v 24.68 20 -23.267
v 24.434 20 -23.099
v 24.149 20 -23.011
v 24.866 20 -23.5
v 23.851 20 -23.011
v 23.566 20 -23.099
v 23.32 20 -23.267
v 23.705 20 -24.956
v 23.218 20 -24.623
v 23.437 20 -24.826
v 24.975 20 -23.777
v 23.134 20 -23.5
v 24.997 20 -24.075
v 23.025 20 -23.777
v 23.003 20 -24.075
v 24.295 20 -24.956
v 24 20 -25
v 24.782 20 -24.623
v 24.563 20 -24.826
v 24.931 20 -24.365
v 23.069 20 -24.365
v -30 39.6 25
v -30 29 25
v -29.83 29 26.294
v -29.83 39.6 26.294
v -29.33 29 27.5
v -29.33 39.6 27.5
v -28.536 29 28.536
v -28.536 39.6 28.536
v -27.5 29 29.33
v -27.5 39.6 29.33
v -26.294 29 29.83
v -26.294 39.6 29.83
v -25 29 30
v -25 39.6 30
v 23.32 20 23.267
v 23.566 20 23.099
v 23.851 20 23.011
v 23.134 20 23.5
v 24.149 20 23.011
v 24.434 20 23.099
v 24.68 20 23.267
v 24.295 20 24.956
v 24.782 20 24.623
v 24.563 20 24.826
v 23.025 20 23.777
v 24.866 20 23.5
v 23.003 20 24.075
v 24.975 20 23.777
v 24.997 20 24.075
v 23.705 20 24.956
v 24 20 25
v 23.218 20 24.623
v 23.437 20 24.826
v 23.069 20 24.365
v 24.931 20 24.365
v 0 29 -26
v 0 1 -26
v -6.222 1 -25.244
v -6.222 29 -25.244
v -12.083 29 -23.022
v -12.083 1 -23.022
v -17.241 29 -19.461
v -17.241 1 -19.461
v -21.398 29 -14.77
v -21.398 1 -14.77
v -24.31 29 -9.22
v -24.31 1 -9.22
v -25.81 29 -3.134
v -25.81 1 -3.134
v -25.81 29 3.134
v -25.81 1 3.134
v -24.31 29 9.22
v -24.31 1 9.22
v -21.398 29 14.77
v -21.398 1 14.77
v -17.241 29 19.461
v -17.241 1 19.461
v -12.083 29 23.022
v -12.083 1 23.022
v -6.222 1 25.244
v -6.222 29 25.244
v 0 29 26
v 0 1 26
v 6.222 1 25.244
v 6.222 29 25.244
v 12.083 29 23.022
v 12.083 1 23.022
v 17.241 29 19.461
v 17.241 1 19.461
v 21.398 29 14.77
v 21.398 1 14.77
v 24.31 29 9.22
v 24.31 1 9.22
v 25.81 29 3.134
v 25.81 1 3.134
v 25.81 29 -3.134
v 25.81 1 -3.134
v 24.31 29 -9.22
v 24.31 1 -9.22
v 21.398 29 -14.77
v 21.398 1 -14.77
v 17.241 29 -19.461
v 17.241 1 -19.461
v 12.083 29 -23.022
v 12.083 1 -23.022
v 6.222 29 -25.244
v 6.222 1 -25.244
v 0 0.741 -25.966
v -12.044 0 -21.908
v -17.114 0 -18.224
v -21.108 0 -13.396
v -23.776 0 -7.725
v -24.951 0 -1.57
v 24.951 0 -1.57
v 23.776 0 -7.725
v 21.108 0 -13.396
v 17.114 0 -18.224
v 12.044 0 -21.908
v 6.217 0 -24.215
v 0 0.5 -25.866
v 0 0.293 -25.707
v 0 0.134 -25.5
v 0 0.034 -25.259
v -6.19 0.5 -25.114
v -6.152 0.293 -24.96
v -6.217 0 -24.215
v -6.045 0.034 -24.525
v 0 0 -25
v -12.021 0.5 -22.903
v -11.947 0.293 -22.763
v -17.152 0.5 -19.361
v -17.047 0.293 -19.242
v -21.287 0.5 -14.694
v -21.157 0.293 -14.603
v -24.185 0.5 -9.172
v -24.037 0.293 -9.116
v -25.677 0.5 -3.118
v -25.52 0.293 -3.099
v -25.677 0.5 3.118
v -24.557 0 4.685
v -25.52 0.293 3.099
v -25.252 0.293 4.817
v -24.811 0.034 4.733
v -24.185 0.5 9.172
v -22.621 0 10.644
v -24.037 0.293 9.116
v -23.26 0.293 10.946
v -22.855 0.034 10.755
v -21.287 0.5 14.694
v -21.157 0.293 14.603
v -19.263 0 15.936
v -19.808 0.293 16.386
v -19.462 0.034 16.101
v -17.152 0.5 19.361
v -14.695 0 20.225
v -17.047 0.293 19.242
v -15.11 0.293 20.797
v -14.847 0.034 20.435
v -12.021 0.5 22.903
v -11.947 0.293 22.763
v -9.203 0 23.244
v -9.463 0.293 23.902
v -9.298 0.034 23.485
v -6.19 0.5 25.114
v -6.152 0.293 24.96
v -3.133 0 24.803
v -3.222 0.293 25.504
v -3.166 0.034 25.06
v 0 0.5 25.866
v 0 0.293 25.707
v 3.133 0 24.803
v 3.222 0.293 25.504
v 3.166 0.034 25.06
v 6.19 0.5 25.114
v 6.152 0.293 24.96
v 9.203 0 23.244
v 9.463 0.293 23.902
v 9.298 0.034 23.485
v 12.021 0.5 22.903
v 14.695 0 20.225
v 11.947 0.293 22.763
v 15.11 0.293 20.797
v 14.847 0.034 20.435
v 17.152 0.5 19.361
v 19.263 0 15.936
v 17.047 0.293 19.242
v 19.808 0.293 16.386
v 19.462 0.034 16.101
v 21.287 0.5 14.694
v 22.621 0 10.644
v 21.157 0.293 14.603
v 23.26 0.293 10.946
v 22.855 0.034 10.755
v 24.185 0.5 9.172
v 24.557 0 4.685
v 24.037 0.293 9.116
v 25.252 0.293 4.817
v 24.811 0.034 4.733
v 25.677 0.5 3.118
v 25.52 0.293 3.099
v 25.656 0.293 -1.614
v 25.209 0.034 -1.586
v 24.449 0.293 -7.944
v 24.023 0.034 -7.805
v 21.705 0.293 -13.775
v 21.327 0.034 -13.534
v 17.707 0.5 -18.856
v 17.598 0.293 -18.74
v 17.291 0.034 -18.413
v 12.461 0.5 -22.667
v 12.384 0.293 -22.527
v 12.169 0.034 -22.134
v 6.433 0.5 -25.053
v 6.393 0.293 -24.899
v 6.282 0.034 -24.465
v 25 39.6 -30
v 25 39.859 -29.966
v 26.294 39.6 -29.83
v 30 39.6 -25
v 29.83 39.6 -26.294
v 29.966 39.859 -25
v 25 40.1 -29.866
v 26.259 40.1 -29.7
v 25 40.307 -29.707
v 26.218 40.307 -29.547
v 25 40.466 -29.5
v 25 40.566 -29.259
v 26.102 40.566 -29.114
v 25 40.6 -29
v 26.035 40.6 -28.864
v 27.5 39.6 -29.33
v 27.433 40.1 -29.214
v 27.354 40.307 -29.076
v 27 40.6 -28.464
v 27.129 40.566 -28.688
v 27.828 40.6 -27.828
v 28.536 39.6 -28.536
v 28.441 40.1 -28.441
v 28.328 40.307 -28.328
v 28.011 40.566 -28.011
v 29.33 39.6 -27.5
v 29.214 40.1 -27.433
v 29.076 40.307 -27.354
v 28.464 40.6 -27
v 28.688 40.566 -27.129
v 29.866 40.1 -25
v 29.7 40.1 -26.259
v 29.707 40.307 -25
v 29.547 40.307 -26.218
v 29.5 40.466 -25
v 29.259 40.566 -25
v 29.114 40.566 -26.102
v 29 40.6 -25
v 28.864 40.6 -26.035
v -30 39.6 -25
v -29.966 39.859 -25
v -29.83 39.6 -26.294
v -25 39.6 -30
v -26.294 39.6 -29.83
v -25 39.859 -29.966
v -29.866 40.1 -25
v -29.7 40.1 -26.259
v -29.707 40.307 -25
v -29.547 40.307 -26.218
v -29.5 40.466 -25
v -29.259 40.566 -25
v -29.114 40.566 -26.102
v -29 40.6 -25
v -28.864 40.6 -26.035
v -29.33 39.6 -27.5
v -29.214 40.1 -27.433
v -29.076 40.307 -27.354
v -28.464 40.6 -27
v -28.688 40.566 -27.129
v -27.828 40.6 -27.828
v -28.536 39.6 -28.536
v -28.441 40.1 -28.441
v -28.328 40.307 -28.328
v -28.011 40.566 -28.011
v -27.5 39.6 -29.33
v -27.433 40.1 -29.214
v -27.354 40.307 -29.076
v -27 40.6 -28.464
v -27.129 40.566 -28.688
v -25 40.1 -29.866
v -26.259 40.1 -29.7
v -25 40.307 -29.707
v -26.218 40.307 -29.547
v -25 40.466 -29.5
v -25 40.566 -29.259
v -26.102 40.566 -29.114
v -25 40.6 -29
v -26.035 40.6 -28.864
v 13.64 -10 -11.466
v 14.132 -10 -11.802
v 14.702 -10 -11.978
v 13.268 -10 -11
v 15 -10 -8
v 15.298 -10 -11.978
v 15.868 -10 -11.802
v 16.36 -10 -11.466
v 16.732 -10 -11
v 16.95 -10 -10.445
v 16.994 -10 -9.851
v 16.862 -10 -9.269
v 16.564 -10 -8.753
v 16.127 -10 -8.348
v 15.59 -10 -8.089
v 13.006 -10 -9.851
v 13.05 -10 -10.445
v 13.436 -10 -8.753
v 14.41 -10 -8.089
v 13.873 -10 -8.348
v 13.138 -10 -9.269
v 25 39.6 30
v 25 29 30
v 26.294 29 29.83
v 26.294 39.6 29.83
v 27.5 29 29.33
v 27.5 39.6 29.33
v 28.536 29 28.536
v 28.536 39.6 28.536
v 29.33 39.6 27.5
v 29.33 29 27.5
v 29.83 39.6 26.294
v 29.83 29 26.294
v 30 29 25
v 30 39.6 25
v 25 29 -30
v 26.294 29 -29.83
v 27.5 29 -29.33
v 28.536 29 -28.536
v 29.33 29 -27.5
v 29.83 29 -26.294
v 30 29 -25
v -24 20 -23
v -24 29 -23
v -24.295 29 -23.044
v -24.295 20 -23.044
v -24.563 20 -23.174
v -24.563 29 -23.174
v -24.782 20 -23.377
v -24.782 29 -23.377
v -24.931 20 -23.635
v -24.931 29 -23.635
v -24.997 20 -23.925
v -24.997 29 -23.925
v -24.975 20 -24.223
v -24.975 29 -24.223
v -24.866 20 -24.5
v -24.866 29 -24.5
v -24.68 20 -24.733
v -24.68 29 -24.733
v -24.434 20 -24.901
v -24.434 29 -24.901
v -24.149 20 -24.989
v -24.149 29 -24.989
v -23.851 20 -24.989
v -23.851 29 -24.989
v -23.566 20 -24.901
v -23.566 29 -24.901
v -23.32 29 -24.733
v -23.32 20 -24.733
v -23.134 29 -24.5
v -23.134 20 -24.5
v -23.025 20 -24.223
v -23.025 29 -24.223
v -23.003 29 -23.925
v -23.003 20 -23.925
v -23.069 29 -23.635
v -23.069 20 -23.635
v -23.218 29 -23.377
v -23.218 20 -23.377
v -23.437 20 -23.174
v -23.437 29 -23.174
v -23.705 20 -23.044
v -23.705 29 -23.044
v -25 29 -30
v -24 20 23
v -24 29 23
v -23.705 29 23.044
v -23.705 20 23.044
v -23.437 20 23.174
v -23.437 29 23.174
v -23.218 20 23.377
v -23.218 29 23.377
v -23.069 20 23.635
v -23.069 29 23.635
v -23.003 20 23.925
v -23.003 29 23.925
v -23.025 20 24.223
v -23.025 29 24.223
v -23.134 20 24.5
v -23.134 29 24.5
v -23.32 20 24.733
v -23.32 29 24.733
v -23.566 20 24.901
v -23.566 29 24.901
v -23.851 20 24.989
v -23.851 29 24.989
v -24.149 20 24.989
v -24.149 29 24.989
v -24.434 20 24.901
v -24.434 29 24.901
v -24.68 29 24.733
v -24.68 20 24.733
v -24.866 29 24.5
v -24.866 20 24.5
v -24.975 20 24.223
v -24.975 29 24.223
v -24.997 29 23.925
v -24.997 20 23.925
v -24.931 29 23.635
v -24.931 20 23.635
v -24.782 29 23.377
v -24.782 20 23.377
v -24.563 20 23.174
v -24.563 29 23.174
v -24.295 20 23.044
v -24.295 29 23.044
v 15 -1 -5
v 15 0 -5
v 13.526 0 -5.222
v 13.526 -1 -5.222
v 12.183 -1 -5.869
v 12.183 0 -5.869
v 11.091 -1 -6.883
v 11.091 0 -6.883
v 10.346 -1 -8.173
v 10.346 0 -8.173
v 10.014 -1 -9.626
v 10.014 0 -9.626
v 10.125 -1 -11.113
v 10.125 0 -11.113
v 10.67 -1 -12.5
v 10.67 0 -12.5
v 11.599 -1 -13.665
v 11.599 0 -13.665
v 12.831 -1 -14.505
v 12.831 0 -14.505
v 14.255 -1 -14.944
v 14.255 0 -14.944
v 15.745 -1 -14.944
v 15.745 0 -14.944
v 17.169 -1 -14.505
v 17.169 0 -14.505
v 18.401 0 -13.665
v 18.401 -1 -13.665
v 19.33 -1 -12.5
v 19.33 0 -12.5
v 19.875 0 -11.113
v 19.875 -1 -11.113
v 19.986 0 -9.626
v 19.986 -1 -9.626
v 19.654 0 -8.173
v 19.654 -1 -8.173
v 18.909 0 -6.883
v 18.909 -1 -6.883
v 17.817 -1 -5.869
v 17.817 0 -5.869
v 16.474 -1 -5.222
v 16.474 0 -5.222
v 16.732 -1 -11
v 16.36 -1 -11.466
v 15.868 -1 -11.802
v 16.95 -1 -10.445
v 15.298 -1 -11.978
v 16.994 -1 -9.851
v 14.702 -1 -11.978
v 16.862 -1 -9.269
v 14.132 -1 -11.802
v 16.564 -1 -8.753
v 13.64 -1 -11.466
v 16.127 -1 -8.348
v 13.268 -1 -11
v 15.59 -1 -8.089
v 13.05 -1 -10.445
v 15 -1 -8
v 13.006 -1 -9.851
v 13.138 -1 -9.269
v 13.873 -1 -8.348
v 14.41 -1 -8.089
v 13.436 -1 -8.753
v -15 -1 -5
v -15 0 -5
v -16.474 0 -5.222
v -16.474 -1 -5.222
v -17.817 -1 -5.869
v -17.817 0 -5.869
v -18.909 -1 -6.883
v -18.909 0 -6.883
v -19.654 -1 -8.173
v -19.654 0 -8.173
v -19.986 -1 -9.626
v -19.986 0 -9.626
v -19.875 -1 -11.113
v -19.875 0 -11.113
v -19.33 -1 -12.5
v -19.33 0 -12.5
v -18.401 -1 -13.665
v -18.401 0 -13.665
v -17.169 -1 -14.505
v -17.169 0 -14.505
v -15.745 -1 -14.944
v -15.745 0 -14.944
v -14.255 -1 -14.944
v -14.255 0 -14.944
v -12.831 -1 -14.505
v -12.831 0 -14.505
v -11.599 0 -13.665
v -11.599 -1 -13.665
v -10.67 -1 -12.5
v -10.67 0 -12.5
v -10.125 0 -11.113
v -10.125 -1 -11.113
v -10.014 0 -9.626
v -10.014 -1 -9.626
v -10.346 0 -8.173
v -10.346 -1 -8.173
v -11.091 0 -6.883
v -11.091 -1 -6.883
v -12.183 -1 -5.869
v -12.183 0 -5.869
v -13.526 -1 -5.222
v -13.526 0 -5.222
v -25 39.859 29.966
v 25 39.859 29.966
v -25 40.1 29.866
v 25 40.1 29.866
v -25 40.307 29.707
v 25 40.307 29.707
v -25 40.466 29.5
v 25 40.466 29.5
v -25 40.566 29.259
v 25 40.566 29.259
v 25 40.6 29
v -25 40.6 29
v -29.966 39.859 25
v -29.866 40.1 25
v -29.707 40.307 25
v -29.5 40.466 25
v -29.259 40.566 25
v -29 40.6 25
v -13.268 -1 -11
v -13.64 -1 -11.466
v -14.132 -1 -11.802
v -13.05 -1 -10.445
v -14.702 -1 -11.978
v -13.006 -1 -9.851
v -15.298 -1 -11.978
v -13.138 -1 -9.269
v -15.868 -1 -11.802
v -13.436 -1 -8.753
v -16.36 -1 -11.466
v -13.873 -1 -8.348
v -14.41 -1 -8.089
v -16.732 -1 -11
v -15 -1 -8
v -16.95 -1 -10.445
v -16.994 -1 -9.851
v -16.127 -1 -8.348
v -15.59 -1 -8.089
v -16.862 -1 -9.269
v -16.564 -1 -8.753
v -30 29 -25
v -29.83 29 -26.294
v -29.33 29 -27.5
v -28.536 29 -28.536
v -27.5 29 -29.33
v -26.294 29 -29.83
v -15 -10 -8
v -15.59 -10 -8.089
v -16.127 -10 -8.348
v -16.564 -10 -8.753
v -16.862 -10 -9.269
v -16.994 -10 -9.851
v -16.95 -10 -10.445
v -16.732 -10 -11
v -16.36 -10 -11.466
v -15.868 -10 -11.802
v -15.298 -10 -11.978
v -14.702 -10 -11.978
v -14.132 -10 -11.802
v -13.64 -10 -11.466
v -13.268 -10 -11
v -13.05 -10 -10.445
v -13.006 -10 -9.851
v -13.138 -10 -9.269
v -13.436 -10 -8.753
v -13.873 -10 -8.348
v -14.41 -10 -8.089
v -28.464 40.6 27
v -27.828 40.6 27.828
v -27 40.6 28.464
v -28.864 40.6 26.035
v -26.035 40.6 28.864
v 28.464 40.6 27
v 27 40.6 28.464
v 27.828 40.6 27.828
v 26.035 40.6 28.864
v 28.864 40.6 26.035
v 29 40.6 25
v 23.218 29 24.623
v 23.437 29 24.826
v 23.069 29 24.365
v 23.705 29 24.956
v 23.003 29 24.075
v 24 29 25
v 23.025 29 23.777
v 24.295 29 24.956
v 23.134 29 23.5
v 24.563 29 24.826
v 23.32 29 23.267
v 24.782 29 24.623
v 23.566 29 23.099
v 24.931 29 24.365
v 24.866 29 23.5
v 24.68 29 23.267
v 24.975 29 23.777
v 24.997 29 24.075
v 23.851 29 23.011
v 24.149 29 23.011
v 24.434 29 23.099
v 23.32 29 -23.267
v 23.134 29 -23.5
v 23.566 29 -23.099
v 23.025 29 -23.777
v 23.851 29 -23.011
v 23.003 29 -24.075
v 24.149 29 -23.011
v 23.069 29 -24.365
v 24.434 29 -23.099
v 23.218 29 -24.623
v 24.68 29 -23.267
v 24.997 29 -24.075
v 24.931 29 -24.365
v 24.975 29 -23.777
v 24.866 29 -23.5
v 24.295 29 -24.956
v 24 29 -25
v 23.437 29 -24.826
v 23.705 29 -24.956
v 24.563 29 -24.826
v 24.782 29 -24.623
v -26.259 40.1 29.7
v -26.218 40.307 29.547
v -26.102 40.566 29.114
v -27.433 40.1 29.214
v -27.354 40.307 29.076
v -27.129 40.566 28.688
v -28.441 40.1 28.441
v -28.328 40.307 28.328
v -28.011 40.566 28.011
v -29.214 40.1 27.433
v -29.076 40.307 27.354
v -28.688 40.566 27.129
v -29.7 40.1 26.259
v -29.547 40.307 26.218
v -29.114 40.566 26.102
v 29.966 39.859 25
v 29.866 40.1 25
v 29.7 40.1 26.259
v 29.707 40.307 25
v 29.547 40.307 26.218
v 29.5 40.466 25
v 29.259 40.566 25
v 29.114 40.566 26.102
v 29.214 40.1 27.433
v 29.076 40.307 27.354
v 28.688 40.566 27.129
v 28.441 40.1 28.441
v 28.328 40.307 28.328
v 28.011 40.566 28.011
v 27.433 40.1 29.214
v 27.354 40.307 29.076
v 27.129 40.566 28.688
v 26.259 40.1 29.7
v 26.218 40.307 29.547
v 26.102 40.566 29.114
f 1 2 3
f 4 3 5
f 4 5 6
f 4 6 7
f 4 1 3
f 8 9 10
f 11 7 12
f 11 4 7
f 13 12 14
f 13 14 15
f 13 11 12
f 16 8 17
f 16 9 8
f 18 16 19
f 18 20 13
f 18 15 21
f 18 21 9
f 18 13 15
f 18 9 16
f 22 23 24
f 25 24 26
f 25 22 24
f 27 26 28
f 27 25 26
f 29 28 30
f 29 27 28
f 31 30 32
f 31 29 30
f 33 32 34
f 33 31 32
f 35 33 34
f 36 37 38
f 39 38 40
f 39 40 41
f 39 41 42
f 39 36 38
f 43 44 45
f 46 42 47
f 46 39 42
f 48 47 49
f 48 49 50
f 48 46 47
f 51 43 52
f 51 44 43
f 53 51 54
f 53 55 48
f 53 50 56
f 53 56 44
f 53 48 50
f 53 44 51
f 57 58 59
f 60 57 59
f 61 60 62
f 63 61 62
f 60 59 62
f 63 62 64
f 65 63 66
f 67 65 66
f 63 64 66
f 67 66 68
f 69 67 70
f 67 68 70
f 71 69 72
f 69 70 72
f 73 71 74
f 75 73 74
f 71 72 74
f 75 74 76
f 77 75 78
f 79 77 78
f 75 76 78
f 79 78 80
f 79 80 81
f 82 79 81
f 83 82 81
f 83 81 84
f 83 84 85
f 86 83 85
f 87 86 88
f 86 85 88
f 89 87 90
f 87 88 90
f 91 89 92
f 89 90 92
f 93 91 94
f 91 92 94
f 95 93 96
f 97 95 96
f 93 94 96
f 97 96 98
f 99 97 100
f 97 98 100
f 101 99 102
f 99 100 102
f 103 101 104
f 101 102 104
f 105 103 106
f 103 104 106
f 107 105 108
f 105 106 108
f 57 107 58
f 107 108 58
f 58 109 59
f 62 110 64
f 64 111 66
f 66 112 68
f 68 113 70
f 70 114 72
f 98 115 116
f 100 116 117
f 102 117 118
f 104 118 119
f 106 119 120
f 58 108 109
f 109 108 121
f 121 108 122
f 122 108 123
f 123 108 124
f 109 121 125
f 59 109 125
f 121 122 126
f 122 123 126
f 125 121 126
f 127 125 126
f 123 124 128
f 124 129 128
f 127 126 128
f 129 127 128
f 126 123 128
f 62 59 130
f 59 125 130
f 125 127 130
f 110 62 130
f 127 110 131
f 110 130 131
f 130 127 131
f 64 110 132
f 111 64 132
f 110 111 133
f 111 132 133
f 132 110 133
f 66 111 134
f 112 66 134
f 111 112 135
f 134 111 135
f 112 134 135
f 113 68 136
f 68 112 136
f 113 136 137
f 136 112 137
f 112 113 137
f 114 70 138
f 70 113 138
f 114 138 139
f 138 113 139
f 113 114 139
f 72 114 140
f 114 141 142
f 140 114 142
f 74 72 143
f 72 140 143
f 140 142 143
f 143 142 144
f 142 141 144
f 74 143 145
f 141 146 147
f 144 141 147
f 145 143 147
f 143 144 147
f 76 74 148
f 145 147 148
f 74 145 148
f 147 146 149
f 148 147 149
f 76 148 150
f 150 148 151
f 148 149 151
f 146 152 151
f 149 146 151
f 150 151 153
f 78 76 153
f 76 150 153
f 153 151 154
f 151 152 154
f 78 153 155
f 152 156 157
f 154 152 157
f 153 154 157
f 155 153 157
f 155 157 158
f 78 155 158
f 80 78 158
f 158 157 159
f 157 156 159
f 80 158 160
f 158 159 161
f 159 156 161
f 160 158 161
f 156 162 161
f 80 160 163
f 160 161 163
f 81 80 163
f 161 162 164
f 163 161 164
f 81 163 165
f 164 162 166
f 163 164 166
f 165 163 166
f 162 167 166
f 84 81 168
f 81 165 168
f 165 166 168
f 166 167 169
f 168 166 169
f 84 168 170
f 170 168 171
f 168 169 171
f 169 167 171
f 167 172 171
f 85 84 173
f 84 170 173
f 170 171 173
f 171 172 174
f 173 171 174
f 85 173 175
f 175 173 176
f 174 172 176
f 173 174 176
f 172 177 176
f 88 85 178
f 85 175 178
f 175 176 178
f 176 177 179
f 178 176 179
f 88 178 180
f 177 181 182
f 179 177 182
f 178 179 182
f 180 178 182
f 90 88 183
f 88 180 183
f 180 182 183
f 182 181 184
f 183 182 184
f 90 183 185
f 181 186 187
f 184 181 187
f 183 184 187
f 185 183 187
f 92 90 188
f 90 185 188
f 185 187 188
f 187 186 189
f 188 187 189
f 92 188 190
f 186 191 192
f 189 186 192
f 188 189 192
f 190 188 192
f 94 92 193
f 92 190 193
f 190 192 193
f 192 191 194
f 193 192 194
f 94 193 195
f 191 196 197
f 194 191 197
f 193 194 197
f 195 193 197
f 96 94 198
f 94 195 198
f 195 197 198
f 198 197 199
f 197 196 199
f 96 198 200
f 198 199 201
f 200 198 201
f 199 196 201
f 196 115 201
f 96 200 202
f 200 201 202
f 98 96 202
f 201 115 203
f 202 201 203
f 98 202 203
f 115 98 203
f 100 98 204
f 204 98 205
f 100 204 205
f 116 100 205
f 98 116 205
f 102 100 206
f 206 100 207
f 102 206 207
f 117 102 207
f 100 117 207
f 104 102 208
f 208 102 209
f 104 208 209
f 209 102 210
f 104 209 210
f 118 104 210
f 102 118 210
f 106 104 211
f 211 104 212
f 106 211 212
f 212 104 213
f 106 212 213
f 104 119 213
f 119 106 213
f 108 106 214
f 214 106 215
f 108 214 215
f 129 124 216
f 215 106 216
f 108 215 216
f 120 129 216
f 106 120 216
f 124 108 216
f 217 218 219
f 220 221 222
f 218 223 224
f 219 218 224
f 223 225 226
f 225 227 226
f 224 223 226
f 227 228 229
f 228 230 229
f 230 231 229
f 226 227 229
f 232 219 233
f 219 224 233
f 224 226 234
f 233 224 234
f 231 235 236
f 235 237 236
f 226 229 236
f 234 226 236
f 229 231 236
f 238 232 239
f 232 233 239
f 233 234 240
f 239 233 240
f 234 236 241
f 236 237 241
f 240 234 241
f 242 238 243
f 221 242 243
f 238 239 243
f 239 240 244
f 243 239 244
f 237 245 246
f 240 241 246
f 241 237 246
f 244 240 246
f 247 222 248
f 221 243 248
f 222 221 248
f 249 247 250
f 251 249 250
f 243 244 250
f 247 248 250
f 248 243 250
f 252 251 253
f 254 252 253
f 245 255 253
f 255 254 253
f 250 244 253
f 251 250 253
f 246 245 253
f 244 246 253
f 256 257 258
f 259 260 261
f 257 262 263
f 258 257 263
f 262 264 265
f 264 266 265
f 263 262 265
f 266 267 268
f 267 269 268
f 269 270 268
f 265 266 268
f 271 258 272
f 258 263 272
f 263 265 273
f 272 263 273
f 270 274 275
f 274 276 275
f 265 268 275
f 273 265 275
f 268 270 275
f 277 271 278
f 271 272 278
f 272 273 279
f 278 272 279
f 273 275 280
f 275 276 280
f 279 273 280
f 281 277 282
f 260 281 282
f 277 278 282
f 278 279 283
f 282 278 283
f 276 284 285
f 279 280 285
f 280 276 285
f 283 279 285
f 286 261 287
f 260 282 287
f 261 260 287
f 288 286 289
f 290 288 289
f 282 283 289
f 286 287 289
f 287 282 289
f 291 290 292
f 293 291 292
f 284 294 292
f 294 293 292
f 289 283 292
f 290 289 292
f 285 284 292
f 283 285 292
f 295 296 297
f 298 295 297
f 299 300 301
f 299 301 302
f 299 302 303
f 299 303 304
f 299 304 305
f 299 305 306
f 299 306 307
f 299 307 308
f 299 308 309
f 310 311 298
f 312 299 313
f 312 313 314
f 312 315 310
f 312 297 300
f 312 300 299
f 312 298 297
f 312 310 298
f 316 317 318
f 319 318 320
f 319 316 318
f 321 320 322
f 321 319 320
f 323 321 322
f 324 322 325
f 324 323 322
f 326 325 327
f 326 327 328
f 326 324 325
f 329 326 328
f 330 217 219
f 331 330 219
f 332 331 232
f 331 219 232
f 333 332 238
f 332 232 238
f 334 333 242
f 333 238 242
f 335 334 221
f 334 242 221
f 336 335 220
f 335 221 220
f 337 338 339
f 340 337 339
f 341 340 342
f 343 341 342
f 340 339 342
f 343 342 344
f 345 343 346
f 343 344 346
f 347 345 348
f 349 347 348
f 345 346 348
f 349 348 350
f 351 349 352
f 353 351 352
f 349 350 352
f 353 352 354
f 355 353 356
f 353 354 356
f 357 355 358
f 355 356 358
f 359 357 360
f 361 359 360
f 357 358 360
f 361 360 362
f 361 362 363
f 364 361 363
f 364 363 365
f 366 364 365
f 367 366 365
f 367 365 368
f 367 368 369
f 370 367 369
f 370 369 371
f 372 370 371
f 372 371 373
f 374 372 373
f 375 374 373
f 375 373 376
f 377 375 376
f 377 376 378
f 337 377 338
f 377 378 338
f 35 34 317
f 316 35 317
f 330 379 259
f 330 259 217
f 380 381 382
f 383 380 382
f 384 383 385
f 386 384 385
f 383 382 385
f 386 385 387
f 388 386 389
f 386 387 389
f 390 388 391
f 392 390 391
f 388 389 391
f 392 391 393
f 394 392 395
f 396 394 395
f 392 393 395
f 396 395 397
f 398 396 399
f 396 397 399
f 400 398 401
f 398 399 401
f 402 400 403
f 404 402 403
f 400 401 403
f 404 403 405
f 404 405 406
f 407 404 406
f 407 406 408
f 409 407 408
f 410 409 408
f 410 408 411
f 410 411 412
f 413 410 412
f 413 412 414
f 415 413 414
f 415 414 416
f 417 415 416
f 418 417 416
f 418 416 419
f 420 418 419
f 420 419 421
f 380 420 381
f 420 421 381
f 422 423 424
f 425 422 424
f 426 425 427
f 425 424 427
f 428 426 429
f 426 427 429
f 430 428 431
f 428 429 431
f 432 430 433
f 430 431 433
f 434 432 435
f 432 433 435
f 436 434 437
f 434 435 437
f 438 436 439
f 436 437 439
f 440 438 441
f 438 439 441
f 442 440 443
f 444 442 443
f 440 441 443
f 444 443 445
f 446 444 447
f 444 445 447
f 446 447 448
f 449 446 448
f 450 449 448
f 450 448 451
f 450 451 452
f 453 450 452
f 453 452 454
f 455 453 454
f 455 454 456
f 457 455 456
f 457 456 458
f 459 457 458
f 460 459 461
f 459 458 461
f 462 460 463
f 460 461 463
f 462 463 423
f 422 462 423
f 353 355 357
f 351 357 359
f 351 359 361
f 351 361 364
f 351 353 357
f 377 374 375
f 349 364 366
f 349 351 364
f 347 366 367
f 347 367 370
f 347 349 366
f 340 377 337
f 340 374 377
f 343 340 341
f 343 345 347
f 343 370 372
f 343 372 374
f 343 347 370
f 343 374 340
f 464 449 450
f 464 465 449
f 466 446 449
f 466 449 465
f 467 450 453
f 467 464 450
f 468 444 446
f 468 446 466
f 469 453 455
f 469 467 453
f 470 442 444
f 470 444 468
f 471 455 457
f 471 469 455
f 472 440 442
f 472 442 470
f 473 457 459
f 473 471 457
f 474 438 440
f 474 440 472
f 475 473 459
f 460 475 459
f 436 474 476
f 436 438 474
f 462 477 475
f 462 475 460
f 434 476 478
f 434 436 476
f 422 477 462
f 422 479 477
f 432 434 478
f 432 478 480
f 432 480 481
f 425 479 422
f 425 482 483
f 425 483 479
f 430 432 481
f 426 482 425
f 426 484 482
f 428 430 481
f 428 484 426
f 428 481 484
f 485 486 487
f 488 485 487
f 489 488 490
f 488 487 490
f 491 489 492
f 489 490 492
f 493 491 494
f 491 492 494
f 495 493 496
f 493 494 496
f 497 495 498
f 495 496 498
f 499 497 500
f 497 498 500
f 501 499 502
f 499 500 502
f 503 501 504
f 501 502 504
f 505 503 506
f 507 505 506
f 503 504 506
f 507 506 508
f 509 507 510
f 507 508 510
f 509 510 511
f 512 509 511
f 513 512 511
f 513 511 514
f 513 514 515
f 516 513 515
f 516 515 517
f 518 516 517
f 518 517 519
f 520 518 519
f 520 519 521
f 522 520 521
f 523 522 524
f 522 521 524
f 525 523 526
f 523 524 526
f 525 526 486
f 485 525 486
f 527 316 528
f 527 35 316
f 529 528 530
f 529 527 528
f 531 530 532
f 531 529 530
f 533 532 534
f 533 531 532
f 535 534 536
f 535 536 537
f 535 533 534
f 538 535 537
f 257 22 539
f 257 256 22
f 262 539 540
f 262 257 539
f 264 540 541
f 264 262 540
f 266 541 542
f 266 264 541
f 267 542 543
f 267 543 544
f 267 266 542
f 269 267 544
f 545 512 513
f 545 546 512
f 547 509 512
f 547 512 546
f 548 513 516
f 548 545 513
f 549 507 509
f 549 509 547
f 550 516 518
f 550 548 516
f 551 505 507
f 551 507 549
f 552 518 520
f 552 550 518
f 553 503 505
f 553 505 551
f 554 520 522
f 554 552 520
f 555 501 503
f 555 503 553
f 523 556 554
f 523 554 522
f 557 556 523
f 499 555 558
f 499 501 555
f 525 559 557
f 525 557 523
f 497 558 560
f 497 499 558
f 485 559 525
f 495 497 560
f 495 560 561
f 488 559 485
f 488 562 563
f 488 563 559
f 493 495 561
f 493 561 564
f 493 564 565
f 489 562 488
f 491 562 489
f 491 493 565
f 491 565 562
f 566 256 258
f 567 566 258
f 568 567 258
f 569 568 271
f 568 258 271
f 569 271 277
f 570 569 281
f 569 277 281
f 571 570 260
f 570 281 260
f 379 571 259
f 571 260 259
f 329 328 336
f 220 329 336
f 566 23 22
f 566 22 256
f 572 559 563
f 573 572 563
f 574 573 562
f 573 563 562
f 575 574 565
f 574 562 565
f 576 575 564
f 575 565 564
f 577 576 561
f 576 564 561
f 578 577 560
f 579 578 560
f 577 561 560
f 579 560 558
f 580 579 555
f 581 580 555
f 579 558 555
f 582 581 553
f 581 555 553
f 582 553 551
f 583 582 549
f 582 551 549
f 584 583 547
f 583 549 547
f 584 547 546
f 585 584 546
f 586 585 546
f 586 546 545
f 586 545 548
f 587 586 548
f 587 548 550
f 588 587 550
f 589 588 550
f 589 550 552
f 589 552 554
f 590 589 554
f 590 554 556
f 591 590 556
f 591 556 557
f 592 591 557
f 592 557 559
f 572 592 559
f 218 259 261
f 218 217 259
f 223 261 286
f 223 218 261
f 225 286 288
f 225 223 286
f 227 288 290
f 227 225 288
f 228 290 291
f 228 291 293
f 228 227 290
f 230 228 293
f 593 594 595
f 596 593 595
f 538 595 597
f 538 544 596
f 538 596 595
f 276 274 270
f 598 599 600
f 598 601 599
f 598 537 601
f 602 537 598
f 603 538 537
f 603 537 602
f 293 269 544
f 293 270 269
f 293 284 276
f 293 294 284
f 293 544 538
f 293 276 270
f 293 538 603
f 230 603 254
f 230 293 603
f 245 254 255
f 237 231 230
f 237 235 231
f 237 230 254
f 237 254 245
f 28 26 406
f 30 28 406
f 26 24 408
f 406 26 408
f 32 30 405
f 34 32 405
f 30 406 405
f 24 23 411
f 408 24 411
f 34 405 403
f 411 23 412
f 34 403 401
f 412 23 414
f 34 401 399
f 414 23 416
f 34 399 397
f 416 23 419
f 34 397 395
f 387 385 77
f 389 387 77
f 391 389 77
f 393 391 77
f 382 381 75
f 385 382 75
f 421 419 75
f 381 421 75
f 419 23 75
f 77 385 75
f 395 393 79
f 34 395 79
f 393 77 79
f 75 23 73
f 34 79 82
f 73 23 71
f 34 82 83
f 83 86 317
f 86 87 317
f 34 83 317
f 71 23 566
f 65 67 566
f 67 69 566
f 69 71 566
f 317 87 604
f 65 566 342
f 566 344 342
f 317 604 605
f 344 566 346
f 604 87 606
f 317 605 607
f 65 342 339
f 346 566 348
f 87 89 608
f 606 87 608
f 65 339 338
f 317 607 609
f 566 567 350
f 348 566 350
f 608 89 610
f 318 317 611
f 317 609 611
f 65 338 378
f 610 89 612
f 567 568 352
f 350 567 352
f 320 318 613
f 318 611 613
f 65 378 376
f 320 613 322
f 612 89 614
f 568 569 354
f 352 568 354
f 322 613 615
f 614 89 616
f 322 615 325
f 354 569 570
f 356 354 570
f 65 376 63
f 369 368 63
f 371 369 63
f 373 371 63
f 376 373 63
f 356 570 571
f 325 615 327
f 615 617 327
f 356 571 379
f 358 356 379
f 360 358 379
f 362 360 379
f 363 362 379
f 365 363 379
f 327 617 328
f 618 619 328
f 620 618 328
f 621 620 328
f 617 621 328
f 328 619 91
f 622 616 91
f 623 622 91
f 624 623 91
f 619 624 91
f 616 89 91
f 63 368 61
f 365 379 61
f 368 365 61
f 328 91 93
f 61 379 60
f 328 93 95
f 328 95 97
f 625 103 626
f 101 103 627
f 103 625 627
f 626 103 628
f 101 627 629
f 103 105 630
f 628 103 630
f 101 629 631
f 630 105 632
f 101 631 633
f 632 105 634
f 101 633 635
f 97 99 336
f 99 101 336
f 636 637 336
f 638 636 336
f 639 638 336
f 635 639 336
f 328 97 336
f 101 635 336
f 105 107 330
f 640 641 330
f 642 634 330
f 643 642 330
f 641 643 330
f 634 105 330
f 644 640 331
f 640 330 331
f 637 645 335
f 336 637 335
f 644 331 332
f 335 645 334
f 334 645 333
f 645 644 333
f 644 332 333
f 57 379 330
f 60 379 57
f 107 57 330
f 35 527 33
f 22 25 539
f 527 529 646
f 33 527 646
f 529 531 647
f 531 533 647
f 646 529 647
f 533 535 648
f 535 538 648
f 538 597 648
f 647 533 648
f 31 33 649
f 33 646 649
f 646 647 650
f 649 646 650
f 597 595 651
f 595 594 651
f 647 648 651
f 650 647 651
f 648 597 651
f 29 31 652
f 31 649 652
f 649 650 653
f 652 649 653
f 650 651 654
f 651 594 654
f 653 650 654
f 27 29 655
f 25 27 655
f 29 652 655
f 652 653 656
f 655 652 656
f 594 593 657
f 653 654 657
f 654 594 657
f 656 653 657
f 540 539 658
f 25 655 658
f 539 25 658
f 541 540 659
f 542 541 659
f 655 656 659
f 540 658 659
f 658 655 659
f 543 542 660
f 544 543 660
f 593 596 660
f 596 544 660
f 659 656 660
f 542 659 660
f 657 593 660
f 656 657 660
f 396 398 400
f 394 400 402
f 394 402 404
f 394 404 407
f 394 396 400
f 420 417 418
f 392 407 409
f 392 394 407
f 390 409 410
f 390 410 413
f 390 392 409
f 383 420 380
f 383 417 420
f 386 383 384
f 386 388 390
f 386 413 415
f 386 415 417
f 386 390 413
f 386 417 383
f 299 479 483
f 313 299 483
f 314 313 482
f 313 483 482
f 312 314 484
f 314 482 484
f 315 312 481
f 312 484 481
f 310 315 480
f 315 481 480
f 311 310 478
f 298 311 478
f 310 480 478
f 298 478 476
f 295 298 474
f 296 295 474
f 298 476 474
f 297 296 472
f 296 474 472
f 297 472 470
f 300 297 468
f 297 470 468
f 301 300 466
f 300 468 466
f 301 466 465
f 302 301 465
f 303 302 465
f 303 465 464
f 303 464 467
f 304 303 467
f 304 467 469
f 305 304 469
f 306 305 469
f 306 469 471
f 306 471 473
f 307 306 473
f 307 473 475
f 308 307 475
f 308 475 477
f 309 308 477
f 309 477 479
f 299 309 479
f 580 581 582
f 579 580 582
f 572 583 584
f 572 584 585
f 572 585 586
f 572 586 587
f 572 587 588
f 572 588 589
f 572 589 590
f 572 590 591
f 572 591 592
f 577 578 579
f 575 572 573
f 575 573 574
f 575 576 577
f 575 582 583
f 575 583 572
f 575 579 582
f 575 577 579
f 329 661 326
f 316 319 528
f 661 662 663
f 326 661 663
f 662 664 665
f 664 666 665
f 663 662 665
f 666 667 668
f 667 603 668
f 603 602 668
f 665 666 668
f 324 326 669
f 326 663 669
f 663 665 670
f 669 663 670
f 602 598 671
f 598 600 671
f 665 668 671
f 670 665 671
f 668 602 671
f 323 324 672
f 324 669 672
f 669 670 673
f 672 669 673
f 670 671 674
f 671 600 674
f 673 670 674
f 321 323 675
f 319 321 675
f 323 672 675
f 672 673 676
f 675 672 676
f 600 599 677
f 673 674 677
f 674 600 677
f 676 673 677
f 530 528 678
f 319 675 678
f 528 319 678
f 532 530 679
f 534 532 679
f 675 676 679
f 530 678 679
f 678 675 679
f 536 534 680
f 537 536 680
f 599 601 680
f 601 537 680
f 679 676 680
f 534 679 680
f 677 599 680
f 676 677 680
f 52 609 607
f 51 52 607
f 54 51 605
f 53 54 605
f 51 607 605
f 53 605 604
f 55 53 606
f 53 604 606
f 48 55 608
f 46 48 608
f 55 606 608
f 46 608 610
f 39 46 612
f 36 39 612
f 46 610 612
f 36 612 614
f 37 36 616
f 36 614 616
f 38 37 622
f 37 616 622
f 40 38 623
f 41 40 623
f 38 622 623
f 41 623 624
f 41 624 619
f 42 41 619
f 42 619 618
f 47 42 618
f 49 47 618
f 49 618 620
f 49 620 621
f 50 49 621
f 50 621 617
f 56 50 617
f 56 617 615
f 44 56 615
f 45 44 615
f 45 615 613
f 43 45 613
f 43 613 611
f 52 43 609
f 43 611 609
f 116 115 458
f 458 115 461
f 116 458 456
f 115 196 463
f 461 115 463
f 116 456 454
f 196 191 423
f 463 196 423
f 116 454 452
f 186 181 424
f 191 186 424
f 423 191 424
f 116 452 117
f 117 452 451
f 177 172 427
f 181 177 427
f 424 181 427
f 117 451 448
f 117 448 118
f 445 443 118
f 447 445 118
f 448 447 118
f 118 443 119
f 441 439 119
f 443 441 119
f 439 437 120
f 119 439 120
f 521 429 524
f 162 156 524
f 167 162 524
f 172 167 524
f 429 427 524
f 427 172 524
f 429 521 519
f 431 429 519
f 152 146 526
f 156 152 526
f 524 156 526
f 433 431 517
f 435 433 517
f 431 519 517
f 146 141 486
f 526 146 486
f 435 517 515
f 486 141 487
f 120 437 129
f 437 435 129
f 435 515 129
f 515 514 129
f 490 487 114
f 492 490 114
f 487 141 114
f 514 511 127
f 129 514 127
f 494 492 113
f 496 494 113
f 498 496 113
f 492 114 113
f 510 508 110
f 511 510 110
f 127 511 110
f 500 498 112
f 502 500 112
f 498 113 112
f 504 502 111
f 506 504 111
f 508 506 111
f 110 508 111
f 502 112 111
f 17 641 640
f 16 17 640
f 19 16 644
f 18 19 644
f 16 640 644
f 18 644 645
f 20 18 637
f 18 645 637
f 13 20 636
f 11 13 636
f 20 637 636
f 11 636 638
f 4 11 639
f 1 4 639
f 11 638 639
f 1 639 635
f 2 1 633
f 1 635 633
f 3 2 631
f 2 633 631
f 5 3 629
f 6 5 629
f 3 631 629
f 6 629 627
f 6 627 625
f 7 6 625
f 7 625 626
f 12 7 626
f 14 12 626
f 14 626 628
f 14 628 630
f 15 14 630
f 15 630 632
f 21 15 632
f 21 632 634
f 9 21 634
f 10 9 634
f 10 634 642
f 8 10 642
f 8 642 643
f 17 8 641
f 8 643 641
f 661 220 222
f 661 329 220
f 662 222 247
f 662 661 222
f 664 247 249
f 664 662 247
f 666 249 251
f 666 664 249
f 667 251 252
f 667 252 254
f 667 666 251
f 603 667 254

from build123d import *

# Parameters (mm, degrees)
SKETCH1_R           = 26
BOSS_EXTRUDE1_DEPTH = 29
SKETCH2_W           = 60
SKETCH2_H           = 60
BOSS_EXTRUDE2_DEPTH = 11.6
FILLET1_R           = 5
SKETCH5_R           = 2
BOSS_EXTRUDE3_DEPTH = 10
SKETCH6_R           = 1
BOSS_EXTRUDE4_DEPTH = 9
FILLET2_R           = 1
FILLET3_R           = 1
SKETCH7_R           = 5
BOSS_EXTRUDE5_DEPTH = 1


with BuildPart() as part:
    # Sketch1 → Boss-Extrude1 (new body)
    with BuildSketch(Plane(origin=(0, 0, 0), x_dir=(1, 0, 0), z_dir=(0, 1, 0))):
        with Locations(Location((0, 0, 0), (0, 0, 90))):
            Circle(SKETCH1_R)
    extrude(amount=BOSS_EXTRUDE1_DEPTH)

    # Sketch2 → Boss-Extrude2 (add)
    with BuildSketch(Plane(origin=(0, 29, 0), x_dir=(1, 0, 0), z_dir=(0, 1, 0))):
        Rectangle(SKETCH2_W, SKETCH2_H)
    extrude(amount=BOSS_EXTRUDE2_DEPTH)

    # Fillet1
    fillet1_edges = [part.edges().sort_by_distance(p)[0] for p in [
        (30, 34.8, 30),
        (30, 34.8, -30),
        (-30, 34.8, -30),
        (-30, 34.8, 30),
    ]]
    fillet(fillet1_edges, radius=FILLET1_R)

    # Sketch5 → Boss-Extrude3 (add)
    with BuildSketch(Plane.XZ):
        with Locations(Location((15, -10, 0), (0, 0, 90))):
            Circle(SKETCH5_R)
        with Locations(Location((-15, -10, 0), (0, 0, 90))):
            Circle(SKETCH5_R)
    extrude(amount=BOSS_EXTRUDE3_DEPTH)

    # Sketch6 → Boss-Extrude4 (add)
    with BuildSketch(Plane.XZ.offset(-29)):
        with Locations(Location((24, -24, 0), (0, 0, 270))):
            Circle(SKETCH6_R)
        with Locations(Location((24, 24, 0), (0, 0, 90))):
            Circle(SKETCH6_R)
        with Locations(Location((-24, 24, 0), (0, 0, 270))):
            Circle(SKETCH6_R)
        with Locations(Location((-24, -24, 0), (0, 0, 90))):
            Circle(SKETCH6_R)
    extrude(amount=BOSS_EXTRUDE4_DEPTH)

    # Fillet2
    fillet2_edges = [part.edges().sort_by_distance(p)[0] for p in [
        (-30, 40.6, 0),
        (0, 40.6, -30),
        (30, 40.6, 0),
        (0, 40.6, 30),
        (28.535533906, 40.6, 28.535533906),
        (28.535533906, 40.6, -28.535533906),
        (-28.535533906, 40.6, 28.535533906),
        (-28.535533906, 40.6, -28.535533906),
    ]]
    fillet(fillet2_edges, radius=FILLET2_R)

    # Fillet3
    fillet3_edges = [part.edges().sort_by_distance(p)[0] for p in [
        (0, 0, 26),
    ]]
    fillet(fillet3_edges, radius=FILLET3_R)

    # Sketch7 → Boss-Extrude5 (add)
    with BuildSketch(Plane.XZ):
        with Locations(Location((15, -10, 0), (0, 0, 90))):
            Circle(SKETCH7_R)
        with Locations(Location((-15, -10, 0), (0, 0, 90))):
            Circle(SKETCH7_R)
    extrude(amount=BOSS_EXTRUDE5_DEPTH)


solid = part.part
